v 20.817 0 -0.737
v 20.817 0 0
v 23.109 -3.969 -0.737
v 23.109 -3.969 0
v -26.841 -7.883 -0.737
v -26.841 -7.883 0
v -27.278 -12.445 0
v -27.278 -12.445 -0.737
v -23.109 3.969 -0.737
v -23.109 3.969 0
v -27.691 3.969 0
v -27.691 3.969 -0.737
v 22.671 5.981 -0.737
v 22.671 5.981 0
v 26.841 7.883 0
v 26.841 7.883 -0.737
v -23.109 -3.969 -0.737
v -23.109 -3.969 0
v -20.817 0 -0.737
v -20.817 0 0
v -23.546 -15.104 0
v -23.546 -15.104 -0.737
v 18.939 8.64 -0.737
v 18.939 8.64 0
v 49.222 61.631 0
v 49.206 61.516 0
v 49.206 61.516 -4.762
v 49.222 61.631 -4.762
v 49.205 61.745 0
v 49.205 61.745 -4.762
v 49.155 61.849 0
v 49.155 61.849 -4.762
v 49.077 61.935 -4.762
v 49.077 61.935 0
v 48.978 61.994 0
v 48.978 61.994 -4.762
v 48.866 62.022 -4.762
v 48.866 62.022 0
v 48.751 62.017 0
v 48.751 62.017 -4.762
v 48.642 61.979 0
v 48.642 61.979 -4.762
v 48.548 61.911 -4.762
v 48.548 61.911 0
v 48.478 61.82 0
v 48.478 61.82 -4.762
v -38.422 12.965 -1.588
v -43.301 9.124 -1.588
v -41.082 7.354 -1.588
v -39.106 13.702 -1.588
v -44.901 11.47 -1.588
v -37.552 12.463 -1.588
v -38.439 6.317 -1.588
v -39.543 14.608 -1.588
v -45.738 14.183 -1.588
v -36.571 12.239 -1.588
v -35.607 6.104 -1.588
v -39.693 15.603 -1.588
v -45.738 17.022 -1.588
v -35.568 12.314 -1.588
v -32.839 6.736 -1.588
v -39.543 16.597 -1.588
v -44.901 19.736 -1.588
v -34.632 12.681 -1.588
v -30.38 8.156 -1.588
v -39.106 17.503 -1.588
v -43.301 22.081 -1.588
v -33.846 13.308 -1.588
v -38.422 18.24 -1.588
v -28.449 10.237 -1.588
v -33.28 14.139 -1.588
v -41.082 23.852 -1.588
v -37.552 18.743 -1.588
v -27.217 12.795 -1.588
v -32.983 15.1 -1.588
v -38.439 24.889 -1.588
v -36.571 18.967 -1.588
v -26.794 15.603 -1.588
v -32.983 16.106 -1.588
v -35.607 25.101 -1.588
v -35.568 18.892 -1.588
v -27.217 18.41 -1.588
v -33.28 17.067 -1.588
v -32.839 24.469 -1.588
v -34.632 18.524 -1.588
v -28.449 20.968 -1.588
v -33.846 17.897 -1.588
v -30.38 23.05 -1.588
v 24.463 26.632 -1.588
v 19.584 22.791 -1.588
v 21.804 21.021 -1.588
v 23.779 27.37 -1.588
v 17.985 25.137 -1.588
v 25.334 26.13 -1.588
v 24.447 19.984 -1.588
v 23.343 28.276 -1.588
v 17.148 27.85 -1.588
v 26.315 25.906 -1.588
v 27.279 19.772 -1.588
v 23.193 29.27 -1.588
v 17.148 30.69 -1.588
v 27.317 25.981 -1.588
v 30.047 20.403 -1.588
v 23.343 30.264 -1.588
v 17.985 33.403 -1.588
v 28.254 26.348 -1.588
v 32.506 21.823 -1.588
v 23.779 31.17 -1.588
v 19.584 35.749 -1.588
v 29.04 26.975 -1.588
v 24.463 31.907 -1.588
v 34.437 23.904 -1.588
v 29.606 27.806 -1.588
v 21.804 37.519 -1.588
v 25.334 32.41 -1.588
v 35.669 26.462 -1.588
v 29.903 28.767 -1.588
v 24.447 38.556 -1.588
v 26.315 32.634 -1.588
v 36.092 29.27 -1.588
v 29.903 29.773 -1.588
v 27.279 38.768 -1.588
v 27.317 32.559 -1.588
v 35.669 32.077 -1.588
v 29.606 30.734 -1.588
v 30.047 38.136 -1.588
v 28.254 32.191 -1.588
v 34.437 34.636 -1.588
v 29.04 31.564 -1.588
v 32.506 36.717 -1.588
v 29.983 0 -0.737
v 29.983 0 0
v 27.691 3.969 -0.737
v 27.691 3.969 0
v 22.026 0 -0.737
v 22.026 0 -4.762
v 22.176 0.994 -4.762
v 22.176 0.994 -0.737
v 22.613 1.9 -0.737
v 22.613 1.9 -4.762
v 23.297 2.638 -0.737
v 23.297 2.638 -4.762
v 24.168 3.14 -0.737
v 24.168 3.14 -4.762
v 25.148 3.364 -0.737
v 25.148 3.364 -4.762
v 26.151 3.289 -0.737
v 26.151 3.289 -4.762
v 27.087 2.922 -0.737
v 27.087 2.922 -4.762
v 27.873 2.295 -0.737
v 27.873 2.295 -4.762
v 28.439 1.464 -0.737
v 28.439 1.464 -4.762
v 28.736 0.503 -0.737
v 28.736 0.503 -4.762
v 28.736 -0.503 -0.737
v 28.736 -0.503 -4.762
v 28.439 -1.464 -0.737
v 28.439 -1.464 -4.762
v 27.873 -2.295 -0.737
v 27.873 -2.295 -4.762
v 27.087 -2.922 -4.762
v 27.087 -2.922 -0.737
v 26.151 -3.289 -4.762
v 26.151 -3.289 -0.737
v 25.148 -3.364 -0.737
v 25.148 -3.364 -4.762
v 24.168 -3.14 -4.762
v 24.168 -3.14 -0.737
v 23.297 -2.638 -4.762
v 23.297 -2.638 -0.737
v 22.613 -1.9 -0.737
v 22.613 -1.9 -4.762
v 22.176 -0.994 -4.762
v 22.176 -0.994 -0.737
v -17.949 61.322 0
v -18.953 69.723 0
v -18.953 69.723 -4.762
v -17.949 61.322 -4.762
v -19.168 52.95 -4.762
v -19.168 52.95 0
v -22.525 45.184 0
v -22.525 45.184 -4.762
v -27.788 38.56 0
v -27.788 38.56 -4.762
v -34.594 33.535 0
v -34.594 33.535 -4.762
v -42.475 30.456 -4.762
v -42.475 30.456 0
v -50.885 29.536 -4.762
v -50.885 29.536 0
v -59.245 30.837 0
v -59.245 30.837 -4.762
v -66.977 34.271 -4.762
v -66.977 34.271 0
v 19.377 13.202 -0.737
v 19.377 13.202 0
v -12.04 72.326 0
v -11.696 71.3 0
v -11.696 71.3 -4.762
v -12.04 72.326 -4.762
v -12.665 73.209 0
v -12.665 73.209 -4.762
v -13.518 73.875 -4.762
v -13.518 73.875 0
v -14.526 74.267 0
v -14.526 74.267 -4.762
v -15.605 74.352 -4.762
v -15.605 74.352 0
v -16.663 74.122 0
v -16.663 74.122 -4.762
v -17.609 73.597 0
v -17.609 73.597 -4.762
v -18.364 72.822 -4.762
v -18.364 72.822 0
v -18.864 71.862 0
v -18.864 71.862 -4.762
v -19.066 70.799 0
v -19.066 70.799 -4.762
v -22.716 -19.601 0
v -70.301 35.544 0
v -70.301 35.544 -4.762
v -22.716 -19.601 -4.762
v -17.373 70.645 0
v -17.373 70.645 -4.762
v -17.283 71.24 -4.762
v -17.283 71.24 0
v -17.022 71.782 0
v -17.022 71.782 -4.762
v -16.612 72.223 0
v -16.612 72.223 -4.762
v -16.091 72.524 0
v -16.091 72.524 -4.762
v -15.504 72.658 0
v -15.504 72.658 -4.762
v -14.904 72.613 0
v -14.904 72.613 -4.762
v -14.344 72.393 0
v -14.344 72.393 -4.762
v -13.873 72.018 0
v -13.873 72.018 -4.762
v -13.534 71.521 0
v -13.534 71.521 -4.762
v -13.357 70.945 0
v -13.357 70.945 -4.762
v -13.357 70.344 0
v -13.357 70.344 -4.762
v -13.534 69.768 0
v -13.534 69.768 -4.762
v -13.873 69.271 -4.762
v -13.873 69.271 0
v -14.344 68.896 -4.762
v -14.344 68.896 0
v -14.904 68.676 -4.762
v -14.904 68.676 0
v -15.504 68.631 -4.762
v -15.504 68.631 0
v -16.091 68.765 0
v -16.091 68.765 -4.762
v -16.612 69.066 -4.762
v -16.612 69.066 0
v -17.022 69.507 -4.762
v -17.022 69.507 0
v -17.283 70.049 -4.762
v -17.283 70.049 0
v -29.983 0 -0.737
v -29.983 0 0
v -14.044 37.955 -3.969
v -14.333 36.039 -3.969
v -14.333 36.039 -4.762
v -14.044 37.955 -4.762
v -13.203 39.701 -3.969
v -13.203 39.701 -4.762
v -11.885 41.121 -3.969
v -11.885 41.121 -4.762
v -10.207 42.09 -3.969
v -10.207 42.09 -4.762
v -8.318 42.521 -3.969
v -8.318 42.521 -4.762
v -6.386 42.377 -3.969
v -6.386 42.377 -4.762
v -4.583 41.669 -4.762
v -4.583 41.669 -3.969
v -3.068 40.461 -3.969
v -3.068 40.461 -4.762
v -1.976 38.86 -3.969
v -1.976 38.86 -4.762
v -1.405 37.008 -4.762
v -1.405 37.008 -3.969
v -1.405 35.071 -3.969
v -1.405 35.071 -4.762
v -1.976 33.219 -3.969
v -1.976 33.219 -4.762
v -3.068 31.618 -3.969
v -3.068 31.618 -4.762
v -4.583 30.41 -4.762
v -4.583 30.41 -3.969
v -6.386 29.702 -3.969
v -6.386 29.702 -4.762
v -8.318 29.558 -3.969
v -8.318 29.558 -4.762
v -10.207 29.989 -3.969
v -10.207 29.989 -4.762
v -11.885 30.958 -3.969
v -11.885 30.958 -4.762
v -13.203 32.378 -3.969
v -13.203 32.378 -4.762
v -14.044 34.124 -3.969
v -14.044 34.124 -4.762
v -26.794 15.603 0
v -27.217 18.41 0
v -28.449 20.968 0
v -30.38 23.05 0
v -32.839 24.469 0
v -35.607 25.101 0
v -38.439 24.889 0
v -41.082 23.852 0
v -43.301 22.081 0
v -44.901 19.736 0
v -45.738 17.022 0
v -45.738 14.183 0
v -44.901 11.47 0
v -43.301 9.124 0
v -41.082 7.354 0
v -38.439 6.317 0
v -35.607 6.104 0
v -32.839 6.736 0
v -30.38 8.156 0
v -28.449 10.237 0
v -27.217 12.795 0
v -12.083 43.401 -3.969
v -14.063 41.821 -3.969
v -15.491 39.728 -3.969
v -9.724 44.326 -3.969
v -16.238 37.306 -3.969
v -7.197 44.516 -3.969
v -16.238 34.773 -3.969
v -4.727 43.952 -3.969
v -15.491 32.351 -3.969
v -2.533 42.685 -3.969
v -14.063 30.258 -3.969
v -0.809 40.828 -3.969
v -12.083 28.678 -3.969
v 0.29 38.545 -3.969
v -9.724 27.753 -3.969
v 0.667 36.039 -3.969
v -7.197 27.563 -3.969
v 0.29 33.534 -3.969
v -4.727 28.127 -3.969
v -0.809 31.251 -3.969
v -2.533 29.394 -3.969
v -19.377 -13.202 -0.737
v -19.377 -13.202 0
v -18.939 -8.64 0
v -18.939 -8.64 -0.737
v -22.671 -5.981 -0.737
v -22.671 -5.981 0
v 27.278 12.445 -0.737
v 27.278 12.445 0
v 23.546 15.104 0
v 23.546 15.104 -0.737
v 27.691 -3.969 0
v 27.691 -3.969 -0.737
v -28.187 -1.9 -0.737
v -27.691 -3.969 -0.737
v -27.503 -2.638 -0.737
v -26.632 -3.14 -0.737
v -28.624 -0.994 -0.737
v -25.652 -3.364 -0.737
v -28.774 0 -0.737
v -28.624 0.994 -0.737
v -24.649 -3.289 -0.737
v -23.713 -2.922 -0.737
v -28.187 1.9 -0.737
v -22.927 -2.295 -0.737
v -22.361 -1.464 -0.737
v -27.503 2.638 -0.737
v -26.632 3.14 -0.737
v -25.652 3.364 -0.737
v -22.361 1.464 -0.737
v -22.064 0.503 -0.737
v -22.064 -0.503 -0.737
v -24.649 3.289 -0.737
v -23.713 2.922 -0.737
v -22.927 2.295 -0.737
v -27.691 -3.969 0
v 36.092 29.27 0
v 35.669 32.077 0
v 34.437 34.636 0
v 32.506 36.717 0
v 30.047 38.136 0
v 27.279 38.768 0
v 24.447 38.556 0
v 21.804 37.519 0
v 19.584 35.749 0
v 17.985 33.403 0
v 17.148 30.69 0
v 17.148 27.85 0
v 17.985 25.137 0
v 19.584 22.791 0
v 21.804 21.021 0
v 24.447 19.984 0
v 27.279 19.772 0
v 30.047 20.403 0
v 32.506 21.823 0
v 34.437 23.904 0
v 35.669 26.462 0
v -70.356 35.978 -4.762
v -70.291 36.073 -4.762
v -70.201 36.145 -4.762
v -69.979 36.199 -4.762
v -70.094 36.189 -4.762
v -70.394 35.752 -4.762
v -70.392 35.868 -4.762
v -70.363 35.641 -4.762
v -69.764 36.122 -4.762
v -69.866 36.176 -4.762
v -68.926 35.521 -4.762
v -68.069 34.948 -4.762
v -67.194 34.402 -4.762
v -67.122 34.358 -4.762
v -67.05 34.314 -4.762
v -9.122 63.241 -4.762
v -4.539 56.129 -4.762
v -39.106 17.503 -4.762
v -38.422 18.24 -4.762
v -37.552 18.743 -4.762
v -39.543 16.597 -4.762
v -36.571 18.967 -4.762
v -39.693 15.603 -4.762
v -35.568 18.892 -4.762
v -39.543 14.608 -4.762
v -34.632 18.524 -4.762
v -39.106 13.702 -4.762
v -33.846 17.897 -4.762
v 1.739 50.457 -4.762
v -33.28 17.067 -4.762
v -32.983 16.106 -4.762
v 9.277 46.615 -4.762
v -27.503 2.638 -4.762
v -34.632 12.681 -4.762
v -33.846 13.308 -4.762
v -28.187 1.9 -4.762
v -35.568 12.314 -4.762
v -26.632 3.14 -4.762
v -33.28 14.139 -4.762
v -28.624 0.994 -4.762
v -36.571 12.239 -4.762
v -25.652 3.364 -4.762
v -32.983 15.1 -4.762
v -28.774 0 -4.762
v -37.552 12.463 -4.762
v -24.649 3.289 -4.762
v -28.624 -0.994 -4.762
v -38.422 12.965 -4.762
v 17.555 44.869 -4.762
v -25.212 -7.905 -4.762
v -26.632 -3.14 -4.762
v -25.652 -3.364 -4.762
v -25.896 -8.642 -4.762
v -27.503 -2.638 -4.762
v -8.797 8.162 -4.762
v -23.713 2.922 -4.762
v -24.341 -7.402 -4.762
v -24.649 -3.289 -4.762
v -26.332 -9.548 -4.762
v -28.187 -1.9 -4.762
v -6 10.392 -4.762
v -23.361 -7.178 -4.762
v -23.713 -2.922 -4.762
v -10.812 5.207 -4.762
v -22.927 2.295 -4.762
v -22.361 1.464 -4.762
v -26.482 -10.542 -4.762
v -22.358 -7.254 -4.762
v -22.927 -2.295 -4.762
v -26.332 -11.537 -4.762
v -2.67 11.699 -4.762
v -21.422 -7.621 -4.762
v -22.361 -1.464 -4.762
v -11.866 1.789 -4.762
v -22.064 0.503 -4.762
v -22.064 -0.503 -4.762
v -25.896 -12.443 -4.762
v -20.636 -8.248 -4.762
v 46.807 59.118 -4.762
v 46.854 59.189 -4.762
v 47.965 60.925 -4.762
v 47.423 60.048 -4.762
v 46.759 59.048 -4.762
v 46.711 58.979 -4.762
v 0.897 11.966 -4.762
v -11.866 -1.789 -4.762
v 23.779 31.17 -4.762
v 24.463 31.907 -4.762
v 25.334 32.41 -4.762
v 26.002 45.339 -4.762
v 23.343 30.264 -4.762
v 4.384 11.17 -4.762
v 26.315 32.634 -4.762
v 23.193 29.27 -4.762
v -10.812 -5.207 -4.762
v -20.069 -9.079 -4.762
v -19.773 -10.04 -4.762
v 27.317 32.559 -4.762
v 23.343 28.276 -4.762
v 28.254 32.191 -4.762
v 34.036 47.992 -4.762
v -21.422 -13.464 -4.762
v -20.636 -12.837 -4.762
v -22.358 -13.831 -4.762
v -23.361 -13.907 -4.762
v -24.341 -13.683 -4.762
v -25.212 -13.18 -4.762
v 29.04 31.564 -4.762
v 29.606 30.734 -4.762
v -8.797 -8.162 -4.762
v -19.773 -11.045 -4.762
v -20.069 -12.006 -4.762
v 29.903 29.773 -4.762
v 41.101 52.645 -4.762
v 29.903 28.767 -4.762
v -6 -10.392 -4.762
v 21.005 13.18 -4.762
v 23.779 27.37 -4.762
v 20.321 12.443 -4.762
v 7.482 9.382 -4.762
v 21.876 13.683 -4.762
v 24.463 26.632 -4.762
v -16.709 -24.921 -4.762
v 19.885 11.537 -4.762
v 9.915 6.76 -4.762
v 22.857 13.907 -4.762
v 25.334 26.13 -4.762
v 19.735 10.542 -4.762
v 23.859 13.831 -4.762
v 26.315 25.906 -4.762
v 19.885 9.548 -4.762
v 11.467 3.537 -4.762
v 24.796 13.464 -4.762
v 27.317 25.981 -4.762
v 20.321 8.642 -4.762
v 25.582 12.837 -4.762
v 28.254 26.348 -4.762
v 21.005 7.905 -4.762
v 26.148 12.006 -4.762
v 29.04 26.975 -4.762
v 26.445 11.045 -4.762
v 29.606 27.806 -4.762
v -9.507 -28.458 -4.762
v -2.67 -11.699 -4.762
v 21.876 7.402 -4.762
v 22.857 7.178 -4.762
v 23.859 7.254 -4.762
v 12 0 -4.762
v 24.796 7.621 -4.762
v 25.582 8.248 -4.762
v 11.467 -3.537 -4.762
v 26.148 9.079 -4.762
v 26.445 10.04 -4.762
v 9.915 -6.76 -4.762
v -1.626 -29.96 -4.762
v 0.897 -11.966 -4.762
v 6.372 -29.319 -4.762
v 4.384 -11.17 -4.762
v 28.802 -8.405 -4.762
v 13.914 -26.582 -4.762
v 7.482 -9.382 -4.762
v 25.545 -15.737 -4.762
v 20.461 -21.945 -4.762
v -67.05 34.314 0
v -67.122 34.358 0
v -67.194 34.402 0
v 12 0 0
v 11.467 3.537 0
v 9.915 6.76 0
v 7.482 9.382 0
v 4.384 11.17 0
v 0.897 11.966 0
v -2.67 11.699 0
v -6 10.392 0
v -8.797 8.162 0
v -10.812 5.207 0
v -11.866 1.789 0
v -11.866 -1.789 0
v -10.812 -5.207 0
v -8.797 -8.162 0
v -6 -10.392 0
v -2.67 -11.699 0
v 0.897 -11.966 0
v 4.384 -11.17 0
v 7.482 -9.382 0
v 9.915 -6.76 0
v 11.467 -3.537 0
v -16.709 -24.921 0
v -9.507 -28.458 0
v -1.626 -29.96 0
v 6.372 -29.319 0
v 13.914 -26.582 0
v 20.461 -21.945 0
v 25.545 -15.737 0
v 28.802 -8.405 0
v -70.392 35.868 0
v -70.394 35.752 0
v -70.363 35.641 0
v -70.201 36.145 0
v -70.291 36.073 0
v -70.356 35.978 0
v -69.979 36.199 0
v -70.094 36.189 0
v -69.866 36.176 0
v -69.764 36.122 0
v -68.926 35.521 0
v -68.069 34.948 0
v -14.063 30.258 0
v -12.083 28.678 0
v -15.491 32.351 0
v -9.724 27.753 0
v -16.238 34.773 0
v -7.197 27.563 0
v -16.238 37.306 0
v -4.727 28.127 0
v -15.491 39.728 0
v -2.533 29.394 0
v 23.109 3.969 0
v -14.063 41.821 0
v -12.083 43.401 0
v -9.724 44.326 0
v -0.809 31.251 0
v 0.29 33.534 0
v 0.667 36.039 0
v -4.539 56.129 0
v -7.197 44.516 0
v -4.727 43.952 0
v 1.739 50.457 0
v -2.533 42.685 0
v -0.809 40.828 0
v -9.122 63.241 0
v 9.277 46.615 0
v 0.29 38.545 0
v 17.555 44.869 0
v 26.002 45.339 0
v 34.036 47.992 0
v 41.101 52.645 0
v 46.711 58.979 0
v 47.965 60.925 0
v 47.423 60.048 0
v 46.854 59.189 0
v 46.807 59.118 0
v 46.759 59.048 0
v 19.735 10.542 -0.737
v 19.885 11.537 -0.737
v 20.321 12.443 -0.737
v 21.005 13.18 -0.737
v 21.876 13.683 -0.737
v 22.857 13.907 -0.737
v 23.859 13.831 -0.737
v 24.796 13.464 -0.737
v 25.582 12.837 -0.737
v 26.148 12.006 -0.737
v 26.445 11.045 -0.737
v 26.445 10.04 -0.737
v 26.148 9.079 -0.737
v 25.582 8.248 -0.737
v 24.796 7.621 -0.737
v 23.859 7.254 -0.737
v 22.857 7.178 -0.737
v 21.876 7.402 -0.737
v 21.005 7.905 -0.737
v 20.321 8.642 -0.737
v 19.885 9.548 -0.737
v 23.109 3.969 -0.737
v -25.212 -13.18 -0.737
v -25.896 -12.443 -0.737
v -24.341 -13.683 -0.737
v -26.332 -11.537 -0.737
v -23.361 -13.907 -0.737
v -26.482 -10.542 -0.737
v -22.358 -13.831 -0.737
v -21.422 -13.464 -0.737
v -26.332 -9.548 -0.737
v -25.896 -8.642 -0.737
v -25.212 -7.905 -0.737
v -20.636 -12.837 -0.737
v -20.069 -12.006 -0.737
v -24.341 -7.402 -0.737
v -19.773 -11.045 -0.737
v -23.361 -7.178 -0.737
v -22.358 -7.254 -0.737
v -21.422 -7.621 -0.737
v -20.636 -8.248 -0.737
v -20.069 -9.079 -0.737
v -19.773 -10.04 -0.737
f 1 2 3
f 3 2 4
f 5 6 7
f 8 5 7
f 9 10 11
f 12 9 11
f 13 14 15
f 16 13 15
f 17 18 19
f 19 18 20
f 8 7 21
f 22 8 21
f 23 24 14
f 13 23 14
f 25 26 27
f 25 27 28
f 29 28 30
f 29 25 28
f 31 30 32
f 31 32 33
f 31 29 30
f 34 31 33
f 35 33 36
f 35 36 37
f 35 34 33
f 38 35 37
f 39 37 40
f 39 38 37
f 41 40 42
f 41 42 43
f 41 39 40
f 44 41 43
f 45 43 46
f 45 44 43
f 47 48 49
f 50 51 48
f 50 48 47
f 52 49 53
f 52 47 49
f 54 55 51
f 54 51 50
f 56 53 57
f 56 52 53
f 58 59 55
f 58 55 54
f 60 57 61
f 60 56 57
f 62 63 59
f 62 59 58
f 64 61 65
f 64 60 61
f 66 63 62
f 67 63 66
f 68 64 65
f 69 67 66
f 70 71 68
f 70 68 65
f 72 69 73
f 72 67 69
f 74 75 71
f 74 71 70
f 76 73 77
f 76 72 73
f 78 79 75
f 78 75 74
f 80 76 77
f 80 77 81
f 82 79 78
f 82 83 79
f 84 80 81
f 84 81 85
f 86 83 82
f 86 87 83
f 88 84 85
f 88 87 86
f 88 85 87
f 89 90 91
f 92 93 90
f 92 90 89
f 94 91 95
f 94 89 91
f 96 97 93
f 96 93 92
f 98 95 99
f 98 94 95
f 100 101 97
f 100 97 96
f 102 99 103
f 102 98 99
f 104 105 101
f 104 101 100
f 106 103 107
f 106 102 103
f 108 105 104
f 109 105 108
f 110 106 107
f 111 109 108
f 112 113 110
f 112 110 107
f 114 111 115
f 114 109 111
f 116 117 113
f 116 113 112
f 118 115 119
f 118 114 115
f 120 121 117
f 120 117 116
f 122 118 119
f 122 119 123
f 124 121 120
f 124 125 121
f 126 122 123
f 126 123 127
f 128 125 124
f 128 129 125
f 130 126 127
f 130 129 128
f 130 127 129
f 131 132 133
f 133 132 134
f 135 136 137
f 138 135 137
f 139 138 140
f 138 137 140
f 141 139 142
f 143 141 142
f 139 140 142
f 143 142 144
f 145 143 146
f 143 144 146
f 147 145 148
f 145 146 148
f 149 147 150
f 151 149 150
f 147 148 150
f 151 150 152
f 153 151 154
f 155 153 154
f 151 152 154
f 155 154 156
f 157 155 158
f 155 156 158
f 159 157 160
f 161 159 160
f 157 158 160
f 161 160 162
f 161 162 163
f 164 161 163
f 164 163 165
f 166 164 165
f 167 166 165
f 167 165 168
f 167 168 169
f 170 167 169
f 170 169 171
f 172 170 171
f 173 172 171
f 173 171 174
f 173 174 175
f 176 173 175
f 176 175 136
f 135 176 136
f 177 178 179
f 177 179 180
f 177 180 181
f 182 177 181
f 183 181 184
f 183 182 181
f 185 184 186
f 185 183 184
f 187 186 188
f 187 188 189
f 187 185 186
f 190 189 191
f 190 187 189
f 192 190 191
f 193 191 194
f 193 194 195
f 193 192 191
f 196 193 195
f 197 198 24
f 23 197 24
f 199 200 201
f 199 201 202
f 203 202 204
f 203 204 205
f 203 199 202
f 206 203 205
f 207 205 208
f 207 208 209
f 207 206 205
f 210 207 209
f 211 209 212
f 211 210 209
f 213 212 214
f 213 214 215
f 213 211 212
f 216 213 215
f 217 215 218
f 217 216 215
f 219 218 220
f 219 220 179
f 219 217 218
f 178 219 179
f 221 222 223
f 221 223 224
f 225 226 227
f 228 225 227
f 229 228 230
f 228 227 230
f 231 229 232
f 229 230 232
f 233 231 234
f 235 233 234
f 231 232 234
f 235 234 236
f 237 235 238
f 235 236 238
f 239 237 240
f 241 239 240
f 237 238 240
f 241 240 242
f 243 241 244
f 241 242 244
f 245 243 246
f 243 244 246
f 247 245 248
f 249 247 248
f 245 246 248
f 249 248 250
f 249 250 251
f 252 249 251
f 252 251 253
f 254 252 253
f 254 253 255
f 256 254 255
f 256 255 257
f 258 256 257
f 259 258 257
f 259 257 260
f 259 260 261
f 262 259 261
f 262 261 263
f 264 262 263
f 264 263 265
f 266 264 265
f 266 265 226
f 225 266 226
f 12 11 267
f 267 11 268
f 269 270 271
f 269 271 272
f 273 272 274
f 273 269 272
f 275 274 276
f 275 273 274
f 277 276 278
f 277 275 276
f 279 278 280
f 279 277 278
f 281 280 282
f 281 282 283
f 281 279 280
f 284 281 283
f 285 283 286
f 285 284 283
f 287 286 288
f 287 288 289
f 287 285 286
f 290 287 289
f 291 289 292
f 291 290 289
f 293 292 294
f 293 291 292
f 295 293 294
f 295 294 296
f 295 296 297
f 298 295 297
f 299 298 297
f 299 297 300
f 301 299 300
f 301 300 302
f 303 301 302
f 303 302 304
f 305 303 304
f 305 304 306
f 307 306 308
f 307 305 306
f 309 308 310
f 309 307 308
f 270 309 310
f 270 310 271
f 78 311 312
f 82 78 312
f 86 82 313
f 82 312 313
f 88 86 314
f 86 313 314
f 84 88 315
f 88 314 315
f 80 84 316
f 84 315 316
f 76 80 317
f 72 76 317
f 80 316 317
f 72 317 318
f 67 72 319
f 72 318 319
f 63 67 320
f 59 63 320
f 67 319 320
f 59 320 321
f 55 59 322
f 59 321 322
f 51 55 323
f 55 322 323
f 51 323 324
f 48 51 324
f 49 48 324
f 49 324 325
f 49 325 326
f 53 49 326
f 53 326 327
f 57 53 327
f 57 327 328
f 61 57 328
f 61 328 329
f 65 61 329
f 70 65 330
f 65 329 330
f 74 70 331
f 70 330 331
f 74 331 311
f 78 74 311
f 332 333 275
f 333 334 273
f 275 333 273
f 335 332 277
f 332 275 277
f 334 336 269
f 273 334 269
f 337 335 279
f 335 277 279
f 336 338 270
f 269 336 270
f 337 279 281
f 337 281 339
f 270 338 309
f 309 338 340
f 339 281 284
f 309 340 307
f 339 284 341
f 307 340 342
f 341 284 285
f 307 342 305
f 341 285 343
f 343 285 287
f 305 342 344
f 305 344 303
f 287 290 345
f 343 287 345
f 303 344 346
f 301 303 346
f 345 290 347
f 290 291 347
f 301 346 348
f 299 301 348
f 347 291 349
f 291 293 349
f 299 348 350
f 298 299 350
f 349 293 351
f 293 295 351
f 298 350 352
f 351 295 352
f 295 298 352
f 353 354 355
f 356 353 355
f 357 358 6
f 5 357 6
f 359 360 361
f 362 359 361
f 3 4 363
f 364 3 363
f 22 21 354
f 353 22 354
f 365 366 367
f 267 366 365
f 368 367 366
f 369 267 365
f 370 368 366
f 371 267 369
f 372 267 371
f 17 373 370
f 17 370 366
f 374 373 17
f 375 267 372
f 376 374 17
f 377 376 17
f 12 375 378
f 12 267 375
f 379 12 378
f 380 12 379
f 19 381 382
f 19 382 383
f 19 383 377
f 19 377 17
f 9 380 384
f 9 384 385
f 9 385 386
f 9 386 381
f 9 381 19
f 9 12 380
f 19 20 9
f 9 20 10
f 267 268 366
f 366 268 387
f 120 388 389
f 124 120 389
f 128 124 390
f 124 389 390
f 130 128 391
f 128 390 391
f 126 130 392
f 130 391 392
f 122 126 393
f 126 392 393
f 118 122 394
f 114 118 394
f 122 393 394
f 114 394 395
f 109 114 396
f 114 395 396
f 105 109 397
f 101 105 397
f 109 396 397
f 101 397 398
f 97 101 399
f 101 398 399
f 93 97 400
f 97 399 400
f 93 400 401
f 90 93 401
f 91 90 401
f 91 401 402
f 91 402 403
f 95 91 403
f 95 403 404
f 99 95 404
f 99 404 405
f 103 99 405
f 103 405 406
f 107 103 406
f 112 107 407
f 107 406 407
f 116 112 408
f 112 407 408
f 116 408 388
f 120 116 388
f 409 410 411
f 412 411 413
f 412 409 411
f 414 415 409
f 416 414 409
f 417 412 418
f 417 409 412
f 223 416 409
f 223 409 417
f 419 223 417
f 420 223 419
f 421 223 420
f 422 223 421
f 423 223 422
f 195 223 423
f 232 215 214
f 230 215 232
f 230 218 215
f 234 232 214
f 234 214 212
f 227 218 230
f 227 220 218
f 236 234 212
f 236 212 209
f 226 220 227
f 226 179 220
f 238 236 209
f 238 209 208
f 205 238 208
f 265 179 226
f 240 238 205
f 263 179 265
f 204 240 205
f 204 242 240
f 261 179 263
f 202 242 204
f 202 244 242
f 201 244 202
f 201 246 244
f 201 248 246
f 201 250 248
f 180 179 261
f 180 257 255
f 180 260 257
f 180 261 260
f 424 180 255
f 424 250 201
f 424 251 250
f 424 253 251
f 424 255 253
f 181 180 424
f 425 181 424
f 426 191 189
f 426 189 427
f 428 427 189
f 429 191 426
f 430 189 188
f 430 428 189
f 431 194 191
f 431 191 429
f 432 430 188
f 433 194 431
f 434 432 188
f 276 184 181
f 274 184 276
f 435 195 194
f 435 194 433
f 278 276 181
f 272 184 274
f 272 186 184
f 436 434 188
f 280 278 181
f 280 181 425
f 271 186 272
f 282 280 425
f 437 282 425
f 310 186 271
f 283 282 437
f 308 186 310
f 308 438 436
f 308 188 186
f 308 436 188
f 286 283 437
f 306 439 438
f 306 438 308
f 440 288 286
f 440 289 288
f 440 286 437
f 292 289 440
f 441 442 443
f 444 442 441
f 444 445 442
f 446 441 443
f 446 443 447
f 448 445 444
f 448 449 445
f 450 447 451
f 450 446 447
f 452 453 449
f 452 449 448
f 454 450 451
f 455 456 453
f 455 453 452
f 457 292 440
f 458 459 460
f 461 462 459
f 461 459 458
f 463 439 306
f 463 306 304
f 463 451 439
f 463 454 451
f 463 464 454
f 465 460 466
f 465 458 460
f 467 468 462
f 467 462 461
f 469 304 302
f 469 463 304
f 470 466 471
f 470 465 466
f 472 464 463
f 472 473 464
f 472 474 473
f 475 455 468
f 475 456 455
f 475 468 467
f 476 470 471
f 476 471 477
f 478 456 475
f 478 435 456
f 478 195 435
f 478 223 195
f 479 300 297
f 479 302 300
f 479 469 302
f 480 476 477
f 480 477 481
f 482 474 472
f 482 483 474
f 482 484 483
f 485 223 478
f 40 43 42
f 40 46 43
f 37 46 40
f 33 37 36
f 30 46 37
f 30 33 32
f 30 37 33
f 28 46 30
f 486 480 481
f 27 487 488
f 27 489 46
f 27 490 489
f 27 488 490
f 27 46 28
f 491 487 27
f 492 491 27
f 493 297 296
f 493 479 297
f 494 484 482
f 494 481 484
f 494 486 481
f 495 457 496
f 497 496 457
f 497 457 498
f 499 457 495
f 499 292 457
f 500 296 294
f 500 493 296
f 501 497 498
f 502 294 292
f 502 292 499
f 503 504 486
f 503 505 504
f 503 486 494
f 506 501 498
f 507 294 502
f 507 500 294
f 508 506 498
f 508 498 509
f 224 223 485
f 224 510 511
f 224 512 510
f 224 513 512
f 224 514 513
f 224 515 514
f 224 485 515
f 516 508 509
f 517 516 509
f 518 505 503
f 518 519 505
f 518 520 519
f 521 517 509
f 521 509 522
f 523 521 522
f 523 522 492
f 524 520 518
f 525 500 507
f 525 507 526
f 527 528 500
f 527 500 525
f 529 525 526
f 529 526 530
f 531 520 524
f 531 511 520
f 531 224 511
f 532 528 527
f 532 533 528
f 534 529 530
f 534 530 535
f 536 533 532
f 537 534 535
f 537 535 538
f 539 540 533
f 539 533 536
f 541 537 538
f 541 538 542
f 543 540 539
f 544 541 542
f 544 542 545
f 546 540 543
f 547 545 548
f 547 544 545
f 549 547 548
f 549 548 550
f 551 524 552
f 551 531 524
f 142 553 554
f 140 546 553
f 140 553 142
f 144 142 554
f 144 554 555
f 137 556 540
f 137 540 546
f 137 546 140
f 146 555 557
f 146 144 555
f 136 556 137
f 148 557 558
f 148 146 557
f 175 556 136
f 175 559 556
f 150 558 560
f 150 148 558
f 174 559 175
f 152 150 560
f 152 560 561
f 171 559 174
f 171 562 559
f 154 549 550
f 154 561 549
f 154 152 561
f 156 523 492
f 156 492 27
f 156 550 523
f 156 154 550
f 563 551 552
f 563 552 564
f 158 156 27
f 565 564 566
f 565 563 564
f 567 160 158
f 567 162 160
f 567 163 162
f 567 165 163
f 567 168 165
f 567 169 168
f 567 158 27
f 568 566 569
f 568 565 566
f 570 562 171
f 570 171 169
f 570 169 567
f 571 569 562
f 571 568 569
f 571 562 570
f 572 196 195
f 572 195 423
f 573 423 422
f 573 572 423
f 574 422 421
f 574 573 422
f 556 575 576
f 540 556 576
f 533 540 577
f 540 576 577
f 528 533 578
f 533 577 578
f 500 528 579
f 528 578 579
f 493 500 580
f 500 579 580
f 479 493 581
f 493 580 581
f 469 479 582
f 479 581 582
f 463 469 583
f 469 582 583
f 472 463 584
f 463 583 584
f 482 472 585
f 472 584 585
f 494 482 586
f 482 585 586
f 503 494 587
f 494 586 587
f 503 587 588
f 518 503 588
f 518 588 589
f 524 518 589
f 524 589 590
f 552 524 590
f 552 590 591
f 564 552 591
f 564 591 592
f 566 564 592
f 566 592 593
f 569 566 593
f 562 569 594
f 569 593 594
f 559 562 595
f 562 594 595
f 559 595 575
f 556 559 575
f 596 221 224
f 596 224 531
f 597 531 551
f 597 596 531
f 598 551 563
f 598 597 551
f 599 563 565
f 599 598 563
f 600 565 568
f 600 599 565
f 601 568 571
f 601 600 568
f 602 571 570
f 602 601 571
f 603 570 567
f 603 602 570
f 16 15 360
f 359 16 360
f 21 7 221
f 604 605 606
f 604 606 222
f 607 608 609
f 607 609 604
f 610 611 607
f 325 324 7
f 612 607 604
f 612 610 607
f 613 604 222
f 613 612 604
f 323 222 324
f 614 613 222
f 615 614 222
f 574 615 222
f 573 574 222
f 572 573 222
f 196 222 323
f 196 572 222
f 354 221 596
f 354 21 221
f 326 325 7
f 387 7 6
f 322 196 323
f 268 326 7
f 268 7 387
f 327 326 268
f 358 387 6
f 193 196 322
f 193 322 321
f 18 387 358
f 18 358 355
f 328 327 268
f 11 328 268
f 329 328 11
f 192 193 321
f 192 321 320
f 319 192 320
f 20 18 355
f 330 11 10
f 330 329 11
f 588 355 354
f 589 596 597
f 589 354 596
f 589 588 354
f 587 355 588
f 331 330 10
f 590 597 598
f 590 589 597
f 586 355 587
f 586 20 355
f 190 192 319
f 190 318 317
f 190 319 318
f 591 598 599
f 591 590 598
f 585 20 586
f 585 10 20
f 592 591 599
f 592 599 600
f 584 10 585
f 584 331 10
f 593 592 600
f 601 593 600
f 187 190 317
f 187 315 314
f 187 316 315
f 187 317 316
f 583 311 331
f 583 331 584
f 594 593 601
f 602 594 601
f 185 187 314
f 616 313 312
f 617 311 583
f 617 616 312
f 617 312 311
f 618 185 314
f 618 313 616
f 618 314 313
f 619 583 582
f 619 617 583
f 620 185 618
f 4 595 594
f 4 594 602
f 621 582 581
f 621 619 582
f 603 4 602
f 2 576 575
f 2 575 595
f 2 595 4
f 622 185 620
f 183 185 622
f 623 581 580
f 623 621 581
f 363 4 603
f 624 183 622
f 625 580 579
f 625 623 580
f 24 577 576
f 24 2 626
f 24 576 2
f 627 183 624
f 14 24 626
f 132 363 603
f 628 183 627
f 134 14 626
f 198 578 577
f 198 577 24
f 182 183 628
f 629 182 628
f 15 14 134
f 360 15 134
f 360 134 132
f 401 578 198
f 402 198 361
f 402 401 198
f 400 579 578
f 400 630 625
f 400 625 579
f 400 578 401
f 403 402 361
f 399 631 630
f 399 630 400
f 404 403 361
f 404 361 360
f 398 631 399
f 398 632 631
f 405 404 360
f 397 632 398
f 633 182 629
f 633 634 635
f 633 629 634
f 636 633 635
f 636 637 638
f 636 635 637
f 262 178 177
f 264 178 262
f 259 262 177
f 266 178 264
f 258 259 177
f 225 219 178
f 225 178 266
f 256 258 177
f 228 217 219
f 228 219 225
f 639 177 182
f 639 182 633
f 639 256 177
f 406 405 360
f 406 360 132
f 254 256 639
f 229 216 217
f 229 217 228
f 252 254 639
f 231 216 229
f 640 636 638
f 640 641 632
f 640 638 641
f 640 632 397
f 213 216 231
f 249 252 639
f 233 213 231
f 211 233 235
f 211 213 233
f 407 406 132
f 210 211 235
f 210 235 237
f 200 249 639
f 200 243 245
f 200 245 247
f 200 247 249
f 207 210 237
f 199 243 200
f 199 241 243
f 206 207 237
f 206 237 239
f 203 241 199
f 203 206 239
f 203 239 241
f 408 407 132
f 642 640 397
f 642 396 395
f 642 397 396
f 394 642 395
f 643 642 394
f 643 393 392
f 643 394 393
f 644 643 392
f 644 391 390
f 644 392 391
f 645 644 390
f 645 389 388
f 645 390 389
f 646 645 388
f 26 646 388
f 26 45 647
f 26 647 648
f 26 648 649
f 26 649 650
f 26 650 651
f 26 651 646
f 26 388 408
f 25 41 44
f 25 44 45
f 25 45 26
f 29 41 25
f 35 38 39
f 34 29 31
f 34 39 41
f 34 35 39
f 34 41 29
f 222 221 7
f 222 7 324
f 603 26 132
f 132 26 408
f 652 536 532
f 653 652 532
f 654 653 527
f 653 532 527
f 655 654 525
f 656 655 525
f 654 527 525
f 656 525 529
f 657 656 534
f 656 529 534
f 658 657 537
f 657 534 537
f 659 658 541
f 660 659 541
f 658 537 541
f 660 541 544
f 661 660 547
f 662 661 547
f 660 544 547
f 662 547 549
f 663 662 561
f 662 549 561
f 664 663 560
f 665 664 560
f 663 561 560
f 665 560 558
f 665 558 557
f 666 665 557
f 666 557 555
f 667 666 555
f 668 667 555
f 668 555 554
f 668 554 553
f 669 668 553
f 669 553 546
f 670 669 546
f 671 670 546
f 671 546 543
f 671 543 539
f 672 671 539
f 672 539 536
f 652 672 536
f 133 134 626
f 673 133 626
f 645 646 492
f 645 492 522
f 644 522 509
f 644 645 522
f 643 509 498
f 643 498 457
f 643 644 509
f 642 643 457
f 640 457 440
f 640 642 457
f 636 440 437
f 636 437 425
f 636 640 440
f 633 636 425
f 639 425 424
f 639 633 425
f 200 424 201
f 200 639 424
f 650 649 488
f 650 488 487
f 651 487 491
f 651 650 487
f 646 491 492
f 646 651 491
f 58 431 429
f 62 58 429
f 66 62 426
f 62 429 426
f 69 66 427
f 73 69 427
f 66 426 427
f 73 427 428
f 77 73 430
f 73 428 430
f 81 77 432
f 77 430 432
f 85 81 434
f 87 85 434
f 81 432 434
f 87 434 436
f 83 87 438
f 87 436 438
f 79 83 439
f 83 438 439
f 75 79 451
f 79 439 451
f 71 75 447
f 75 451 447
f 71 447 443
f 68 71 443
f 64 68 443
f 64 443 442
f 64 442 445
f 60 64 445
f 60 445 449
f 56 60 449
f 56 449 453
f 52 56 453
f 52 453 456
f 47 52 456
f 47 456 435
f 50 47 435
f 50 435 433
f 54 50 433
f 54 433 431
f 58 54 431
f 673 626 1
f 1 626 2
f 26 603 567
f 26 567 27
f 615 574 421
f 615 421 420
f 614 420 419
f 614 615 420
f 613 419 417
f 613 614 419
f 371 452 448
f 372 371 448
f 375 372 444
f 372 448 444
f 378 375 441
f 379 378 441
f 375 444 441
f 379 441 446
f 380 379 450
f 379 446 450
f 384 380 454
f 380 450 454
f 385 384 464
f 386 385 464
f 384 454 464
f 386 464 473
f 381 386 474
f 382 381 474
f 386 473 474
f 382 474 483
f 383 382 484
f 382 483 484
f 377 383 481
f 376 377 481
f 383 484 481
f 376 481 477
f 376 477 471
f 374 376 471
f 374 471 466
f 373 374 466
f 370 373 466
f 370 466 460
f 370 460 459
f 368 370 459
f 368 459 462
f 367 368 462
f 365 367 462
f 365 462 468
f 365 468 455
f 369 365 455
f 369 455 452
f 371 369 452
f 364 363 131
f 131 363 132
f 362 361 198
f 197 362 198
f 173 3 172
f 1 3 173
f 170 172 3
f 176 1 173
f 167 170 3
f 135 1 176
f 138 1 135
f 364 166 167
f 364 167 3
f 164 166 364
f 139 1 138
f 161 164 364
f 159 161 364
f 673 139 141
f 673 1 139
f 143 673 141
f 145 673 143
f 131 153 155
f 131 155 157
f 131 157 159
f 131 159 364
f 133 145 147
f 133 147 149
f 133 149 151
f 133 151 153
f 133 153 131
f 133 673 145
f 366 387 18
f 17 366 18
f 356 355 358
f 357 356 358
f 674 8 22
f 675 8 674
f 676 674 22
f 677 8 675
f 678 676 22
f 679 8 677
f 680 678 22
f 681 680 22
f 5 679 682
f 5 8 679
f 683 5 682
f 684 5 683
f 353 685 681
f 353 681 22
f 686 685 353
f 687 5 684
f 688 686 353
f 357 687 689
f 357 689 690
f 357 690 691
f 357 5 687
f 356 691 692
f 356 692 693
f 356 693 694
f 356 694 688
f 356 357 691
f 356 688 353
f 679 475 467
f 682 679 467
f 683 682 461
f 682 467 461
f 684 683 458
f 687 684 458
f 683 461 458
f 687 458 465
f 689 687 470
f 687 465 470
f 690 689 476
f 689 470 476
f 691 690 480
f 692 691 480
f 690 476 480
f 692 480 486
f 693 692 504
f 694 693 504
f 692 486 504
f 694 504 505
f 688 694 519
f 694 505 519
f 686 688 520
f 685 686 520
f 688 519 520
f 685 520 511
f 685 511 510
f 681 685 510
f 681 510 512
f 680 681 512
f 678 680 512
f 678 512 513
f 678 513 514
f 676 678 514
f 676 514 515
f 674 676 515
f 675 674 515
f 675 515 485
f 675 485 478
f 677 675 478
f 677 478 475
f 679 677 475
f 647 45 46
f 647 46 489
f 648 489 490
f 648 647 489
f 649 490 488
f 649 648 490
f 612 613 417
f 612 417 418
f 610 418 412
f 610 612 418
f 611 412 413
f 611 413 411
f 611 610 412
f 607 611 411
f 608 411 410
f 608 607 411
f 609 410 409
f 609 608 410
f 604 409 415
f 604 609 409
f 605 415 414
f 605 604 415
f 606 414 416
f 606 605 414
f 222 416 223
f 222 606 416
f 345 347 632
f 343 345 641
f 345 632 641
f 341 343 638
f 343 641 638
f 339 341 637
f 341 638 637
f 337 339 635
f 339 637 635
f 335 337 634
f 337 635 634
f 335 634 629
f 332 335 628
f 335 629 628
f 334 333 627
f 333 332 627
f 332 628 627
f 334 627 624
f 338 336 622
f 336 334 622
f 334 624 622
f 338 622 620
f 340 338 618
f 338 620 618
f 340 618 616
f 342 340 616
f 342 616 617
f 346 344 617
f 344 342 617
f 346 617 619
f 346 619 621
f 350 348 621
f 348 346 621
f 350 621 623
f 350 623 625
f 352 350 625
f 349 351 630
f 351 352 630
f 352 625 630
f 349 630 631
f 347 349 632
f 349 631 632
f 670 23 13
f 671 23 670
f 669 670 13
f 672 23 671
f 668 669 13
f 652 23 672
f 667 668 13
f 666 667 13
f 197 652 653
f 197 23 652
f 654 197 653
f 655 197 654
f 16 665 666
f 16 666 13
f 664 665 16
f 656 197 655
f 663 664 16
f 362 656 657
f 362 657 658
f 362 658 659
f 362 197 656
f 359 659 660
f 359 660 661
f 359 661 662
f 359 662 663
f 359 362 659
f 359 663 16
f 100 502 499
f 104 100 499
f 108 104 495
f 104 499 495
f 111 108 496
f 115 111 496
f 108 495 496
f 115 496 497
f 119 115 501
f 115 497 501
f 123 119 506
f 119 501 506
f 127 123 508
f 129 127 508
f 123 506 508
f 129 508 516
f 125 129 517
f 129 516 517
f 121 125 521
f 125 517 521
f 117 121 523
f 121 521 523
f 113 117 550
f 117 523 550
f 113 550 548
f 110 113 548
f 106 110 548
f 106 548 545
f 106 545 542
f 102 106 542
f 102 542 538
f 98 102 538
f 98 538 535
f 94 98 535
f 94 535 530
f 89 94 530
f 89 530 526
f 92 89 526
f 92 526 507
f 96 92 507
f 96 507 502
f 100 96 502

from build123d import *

# Parameters (mm, degrees)
SKETCH1_R                        = 12.000000003
SKETCH1_R_2                      = 8.500000018
BOSS_EXTRUDE1_DEPTH              = 4.7625
SKETCH1_4_R                      = 9.525
CUT_EXTRUDE1_DEPTH               = 1.5875
F_10_32_TAPPED_HOLE1_D           = 4.0386
BOSS_EXTRUDE3_START              = -0.79375
SKETCH7_R                        = 8.500000018
SKETCH7_R_2                      = 6.5
BOSS_EXTRUDE3_DEPTH              = 0.79375
F_17_64_0_26563_DIAMETER_HOLE1_D = 6.747002
CUT_EXTRUDE2_DEPTH               = 0.7366


with BuildPart() as part:
    # Sketch1 → Boss-Extrude1 (new body)
    with BuildSketch(Plane.XY):
        with BuildLine():
            Line((-70.300649756, 35.543758941), (-22.715793489, -19.601472909))
            ThreePointArc((-22.715793489, -19.601472909), (6.372007721, -29.319320109), (28.80246523, -8.404939663))
            Line((28.80246523, -8.404939663), (49.20643424, 61.516396068))
            ThreePointArc((49.20643424, 61.516396068), (48.977980792, 61.993965606), (48.478121662, 61.819596767))
            ThreePointArc((48.478121662, 61.819596767), (47.697638407, 60.484610946), (46.853975269, 59.18862724))
            ThreePointArc((46.853975269, 59.18862724), (46.782773661, 59.083463588), (46.711157924, 58.978581516))
            ThreePointArc((46.711157924, 58.978581516), (13.35804262, 45.469068231), (-11.695774538, 71.300125033))
            ThreePointArc((-11.695774538, 71.300125033), (-16.142405131, 74.275551921), (-18.952954781, 69.722915382))
            ThreePointArc((-18.952954781, 69.722915382), (-31.025391021, 35.82315688), (-66.977119299, 34.270553581))
            ThreePointArc((-66.977119299, 34.270553581), (-67.0858071, 34.336250039), (-67.194235, 34.402374566))
            ThreePointArc((-67.194235, 34.402374566), (-68.499704148, 35.231284429), (-69.763880718, 36.121901549))
            ThreePointArc((-69.763880718, 36.121901549), (-70.291023197, 36.073070731), (-70.300649756, 35.543758941))
        make_face()
        Circle(SKETCH1_R, mode=Mode.SUBTRACT)
        with Locations((-7.832512348, 36.039494433)):
            Circle(SKETCH1_R_2, mode=Mode.SUBTRACT)
    extrude(amount=-BOSS_EXTRUDE1_DEPTH)

    # Sketch1<4> → Cut-Extrude1 (cut)
    with BuildSketch(Plane.XY):
        with Locations((-36.319050549, 15.602840887)):
            Circle(SKETCH1_4_R)
        with Locations((26.566795152, 29.269907275)):
            Circle(SKETCH1_4_R)
    extrude(amount=-CUT_EXTRUDE1_DEPTH, mode=Mode.SUBTRACT)

    # #10-32 Tapped Hole1 (through all)
    with Locations(Plane.XY):
        with Locations((-15.353270713, 70.644524994)):
            Hole(F_10_32_TAPPED_HOLE1_D / 2)

    # Sketch7 → Boss-Extrude3 (add)
    with BuildSketch(Plane(origin=(0, 0, -4.7625), x_dir=(-1, 0, 0), z_dir=(0, 0, -1)).offset(BOSS_EXTRUDE3_START)):
        with Locations((7.832512348, 36.039494433)):
            Circle(SKETCH7_R)
        with Locations((7.832512348, 36.039494433)):
            Circle(SKETCH7_R_2, mode=Mode.SUBTRACT)
    extrude(amount=BOSS_EXTRUDE3_DEPTH)

    # 17/64 (0.26563) Diameter Hole1 (through all)
    with Locations(Plane.XY):
        with Locations((-36.319050549, 15.602840887), (26.566795152, 29.269907275), (23.108788276, 10.542480941), (25.4, 0), (-23.108788276, -10.542480941), (-25.4, 0)):
            Hole(F_17_64_0_26563_DIAMETER_HOLE1_D / 2)

    # Sketch1<5> → Cut-Extrude2 (cut)
    with BuildSketch(Plane.XY):
        Polygon((-27.691358881, 3.96875), (-29.982717762, 0), (-27.691358881, -3.96875), (-23.108641119, -3.96875), (-20.817282238, 0), (-23.108641119, 3.96875), align=None)
        Polygon((-19.376859203, -13.202181577), (-18.939455423, -8.640385876), (-22.671384497, -5.98068524), (-26.84071735, -7.882780306), (-27.27812113, -12.444576006), (-23.546192056, -15.104276642), align=None)
        Polygon((19.376859203, 13.202181577), (18.939455423, 8.640385876), (22.671384497, 5.98068524), (26.84071735, 7.882780306), (27.27812113, 12.444576006), (23.546192056, 15.104276642), align=None)
        Polygon((23.108641119, 3.96875), (20.817282238, 0), (23.108641119, -3.96875), (27.691358881, -3.96875), (29.982717762, 0), (27.691358881, 3.96875), align=None)
    extrude(amount=-CUT_EXTRUDE2_DEPTH, mode=Mode.SUBTRACT)


solid = part.part
